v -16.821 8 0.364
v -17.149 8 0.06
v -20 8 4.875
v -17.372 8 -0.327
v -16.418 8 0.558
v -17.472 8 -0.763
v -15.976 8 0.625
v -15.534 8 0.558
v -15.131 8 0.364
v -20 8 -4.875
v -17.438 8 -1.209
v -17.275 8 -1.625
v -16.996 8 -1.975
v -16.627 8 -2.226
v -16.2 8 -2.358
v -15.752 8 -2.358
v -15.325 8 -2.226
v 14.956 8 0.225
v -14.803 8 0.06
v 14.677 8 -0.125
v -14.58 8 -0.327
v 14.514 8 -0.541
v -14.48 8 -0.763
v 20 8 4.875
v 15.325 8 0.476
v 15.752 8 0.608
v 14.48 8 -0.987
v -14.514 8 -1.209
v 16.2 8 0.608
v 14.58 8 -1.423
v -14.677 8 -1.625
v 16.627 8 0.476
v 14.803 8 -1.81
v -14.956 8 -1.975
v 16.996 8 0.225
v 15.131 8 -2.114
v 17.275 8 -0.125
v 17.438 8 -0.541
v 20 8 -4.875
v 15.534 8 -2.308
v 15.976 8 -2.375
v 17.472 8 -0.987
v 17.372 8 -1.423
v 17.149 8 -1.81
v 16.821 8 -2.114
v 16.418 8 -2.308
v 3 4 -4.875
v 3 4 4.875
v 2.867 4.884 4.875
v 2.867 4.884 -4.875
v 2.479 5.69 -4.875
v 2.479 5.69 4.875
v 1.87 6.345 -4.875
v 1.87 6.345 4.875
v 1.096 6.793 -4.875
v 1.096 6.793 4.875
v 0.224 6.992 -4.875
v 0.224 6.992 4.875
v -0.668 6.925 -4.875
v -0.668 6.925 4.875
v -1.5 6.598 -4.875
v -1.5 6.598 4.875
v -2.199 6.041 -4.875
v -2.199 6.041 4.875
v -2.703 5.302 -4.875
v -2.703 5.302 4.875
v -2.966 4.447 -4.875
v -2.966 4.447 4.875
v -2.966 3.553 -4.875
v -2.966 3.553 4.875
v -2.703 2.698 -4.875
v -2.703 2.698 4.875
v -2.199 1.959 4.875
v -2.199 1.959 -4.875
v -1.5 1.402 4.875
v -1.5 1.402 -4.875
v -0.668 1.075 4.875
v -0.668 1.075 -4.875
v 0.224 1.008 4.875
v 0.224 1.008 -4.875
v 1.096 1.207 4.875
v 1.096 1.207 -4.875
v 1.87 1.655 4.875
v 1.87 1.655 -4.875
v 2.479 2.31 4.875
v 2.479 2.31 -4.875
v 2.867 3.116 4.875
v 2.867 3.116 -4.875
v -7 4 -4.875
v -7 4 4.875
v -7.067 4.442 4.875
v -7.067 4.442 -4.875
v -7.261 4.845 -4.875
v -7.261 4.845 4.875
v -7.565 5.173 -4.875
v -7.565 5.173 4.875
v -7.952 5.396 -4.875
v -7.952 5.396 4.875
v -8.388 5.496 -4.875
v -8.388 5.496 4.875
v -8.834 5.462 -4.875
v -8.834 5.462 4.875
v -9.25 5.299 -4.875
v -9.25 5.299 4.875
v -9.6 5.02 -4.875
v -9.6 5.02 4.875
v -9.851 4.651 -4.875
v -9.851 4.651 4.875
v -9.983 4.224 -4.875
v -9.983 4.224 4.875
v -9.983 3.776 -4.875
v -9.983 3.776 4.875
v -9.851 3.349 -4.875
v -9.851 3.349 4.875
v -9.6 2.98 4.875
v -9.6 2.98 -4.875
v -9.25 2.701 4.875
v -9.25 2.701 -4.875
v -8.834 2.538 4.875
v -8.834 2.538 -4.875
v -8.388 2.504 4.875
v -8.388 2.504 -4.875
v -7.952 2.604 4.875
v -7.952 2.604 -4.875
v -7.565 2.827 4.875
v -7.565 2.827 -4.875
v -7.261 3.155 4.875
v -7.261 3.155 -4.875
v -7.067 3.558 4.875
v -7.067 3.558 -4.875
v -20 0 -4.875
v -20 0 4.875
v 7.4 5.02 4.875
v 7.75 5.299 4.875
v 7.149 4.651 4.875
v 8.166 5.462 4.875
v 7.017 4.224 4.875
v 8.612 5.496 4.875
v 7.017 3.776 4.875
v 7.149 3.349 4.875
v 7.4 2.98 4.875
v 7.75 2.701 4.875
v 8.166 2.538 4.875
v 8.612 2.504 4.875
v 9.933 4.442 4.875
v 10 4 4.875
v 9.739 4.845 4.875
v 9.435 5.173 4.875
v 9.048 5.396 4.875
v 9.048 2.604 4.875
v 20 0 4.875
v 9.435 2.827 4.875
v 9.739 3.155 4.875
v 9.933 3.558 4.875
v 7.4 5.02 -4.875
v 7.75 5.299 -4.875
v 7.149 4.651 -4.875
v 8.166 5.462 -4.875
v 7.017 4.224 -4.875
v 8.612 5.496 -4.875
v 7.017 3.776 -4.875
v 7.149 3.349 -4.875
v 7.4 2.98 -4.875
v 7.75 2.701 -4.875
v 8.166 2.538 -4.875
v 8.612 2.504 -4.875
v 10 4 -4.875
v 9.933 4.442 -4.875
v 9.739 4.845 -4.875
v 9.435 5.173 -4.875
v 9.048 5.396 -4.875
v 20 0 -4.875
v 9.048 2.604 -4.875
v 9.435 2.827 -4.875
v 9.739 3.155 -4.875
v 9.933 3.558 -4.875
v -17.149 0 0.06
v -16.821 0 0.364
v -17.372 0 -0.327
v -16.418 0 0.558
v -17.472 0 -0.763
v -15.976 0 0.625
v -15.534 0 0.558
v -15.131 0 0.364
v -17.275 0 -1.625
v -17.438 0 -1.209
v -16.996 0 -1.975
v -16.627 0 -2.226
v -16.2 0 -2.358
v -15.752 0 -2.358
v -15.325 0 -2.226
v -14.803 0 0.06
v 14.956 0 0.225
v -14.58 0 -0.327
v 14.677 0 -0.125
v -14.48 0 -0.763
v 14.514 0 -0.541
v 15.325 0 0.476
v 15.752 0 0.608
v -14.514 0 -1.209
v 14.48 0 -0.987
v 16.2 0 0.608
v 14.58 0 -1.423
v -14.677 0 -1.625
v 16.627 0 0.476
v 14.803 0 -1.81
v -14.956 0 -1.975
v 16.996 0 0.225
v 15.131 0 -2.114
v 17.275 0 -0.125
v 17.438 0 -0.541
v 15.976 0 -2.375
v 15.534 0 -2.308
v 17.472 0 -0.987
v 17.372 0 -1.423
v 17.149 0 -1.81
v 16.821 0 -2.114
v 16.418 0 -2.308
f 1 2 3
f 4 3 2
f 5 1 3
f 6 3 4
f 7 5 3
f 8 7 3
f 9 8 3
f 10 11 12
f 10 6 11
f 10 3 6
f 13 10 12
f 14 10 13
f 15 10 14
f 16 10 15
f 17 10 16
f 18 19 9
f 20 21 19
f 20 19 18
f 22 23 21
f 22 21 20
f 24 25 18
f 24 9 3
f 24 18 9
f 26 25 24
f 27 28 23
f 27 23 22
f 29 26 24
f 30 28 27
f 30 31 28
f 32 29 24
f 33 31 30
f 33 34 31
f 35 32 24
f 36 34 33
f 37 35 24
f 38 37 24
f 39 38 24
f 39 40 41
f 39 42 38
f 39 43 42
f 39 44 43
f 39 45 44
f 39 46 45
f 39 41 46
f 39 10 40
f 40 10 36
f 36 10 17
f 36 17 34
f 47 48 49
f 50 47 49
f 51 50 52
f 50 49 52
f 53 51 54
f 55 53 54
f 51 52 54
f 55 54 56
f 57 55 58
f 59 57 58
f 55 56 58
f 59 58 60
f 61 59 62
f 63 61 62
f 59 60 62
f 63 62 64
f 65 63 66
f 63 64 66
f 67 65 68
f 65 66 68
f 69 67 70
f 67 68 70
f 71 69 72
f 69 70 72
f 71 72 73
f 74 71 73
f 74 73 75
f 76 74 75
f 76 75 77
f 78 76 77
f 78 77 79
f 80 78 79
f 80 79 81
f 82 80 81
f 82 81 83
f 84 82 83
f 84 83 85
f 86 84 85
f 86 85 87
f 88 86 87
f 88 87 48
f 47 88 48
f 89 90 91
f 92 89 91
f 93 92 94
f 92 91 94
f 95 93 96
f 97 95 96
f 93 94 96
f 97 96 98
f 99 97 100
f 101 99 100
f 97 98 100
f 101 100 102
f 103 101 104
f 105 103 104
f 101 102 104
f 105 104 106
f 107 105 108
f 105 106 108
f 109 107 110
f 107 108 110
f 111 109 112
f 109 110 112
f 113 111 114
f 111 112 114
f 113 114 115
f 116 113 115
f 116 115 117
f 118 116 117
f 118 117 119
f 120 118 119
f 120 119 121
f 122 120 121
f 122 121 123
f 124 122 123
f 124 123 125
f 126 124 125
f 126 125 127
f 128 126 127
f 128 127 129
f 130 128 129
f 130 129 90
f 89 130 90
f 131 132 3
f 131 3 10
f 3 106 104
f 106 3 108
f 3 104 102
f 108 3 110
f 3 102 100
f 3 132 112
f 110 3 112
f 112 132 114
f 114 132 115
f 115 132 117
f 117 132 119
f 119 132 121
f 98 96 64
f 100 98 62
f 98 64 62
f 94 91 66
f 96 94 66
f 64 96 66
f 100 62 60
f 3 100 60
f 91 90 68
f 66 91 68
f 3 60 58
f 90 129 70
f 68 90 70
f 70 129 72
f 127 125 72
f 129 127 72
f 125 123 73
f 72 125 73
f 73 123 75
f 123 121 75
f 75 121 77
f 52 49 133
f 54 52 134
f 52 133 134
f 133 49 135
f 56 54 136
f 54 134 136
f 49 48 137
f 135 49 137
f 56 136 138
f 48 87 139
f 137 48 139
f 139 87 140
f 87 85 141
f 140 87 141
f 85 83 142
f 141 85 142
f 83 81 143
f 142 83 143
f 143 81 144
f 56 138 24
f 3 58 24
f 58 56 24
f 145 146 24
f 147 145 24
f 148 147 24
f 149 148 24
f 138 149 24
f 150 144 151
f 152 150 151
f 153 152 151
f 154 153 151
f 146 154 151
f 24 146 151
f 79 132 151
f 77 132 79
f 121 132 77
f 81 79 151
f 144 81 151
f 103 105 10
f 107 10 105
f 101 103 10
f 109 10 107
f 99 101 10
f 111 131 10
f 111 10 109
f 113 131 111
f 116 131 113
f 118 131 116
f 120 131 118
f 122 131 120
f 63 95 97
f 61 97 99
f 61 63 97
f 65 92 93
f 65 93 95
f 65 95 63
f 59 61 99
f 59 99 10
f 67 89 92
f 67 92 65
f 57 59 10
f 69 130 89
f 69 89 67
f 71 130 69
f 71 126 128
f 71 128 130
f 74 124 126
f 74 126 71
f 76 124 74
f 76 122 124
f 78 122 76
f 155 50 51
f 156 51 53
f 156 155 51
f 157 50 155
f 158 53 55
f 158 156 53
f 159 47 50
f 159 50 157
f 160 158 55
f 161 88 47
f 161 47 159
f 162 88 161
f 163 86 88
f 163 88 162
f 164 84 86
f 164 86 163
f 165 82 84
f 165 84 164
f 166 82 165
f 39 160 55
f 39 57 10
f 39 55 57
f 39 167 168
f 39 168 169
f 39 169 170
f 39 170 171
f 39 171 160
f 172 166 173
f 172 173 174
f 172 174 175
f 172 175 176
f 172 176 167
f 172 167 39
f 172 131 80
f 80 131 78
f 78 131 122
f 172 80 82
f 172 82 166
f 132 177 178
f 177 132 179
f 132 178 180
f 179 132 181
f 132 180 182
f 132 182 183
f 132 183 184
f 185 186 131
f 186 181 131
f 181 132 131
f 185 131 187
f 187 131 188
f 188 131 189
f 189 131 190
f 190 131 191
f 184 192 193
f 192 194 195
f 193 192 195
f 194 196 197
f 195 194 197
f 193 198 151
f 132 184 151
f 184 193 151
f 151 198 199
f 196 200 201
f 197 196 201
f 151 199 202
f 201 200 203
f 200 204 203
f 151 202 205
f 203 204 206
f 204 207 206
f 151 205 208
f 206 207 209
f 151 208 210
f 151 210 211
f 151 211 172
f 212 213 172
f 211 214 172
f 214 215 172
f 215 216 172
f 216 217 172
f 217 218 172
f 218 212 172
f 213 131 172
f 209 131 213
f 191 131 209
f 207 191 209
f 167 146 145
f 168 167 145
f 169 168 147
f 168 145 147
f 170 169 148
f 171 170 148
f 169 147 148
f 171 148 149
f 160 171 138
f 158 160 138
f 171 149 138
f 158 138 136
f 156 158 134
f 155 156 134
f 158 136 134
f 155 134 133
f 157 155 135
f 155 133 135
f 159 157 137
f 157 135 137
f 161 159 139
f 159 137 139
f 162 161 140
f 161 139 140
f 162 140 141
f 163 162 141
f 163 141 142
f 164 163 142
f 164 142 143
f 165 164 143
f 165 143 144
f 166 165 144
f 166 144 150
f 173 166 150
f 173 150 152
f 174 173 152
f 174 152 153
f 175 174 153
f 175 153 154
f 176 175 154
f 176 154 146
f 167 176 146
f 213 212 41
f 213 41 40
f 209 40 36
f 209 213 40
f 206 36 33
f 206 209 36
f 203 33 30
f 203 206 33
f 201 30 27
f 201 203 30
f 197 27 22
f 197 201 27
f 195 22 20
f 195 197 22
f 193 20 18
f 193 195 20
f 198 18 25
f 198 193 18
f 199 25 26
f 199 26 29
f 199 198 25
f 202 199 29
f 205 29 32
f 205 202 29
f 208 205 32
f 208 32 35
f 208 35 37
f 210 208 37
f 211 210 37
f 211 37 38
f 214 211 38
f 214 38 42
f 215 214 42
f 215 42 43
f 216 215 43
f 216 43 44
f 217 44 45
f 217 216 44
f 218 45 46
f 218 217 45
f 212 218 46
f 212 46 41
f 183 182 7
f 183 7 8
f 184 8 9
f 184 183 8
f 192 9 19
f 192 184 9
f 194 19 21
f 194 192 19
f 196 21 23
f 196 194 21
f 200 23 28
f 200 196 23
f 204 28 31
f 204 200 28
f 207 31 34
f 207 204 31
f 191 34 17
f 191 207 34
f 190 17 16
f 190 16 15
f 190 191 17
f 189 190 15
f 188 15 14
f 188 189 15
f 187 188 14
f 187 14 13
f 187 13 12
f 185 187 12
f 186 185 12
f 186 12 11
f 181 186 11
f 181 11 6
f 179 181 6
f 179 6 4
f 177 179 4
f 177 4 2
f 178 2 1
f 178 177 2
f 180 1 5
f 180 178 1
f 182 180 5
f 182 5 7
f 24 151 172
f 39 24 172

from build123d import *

# Parameters (mm, degrees)
SKETCH1_W           = 40
SKETCH1_H           = 9.75
SKETCH1_R           = 1.5
BOSS_EXTRUDE1_DEPTH = 8
CUT_EXTRUDE1_REACH  = 25.645
SKETCH2_R           = 3
SKETCH2_R_2         = 1.5


with BuildPart() as part:
    # Sketch1 → Boss-Extrude1 (new body)
    with BuildSketch(Plane(origin=(0, 0, 0), x_dir=(1, 0, 0), z_dir=(0, 1, 0))):
        Rectangle(SKETCH1_W, SKETCH1_H)
        with Locations(Location((-15.976056303, 0.875, 0), (0, 0, 270))):
            Circle(SKETCH1_R, mode=Mode.SUBTRACT)
        with Locations(Location((15.976056303, 0.875, 0), (0, 0, 90))):
            Circle(SKETCH1_R, mode=Mode.SUBTRACT)
    extrude(amount=BOSS_EXTRUDE1_DEPTH)

    # Sketch2 → Cut-Extrude1 (cut, up to next)
    with BuildSketch(Plane.XY.offset(4.875), mode=Mode.PRIVATE) as cut_extrude1_sk1:
        with Locations((0, 4)):
            Circle(SKETCH2_R)
    cut_extrude1_tool1 = extrude(cut_extrude1_sk1.sketch, amount=-CUT_EXTRUDE1_REACH, mode=Mode.PRIVATE) & part.part
    # Sketch2 → Cut-Extrude1 (cut, up to next)
    with BuildSketch(Plane.XY.offset(4.875), mode=Mode.PRIVATE) as cut_extrude1_sk2:
        with Locations((8.5, 4)):
            Circle(SKETCH2_R_2)
    cut_extrude1_tool2 = extrude(cut_extrude1_sk2.sketch, amount=-CUT_EXTRUDE1_REACH, mode=Mode.PRIVATE) & part.part
    # Sketch2 → Cut-Extrude1 (cut, up to next)
    with BuildSketch(Plane.XY.offset(4.875), mode=Mode.PRIVATE) as cut_extrude1_sk3:
        with Locations((-8.5, 4)):
            Circle(SKETCH2_R_2)
    cut_extrude1_tool3 = extrude(cut_extrude1_sk3.sketch, amount=-CUT_EXTRUDE1_REACH, mode=Mode.PRIVATE) & part.part
    add(cut_extrude1_tool1.solids().sort_by_distance((0, 4, 4.875))[0], mode=Mode.SUBTRACT)
    add(cut_extrude1_tool2.solids().sort_by_distance((8.5, 4, 4.875))[0], mode=Mode.SUBTRACT)
    add(cut_extrude1_tool3.solids().sort_by_distance((-8.5, 4, 4.875))[0], mode=Mode.SUBTRACT)


solid = part.part
